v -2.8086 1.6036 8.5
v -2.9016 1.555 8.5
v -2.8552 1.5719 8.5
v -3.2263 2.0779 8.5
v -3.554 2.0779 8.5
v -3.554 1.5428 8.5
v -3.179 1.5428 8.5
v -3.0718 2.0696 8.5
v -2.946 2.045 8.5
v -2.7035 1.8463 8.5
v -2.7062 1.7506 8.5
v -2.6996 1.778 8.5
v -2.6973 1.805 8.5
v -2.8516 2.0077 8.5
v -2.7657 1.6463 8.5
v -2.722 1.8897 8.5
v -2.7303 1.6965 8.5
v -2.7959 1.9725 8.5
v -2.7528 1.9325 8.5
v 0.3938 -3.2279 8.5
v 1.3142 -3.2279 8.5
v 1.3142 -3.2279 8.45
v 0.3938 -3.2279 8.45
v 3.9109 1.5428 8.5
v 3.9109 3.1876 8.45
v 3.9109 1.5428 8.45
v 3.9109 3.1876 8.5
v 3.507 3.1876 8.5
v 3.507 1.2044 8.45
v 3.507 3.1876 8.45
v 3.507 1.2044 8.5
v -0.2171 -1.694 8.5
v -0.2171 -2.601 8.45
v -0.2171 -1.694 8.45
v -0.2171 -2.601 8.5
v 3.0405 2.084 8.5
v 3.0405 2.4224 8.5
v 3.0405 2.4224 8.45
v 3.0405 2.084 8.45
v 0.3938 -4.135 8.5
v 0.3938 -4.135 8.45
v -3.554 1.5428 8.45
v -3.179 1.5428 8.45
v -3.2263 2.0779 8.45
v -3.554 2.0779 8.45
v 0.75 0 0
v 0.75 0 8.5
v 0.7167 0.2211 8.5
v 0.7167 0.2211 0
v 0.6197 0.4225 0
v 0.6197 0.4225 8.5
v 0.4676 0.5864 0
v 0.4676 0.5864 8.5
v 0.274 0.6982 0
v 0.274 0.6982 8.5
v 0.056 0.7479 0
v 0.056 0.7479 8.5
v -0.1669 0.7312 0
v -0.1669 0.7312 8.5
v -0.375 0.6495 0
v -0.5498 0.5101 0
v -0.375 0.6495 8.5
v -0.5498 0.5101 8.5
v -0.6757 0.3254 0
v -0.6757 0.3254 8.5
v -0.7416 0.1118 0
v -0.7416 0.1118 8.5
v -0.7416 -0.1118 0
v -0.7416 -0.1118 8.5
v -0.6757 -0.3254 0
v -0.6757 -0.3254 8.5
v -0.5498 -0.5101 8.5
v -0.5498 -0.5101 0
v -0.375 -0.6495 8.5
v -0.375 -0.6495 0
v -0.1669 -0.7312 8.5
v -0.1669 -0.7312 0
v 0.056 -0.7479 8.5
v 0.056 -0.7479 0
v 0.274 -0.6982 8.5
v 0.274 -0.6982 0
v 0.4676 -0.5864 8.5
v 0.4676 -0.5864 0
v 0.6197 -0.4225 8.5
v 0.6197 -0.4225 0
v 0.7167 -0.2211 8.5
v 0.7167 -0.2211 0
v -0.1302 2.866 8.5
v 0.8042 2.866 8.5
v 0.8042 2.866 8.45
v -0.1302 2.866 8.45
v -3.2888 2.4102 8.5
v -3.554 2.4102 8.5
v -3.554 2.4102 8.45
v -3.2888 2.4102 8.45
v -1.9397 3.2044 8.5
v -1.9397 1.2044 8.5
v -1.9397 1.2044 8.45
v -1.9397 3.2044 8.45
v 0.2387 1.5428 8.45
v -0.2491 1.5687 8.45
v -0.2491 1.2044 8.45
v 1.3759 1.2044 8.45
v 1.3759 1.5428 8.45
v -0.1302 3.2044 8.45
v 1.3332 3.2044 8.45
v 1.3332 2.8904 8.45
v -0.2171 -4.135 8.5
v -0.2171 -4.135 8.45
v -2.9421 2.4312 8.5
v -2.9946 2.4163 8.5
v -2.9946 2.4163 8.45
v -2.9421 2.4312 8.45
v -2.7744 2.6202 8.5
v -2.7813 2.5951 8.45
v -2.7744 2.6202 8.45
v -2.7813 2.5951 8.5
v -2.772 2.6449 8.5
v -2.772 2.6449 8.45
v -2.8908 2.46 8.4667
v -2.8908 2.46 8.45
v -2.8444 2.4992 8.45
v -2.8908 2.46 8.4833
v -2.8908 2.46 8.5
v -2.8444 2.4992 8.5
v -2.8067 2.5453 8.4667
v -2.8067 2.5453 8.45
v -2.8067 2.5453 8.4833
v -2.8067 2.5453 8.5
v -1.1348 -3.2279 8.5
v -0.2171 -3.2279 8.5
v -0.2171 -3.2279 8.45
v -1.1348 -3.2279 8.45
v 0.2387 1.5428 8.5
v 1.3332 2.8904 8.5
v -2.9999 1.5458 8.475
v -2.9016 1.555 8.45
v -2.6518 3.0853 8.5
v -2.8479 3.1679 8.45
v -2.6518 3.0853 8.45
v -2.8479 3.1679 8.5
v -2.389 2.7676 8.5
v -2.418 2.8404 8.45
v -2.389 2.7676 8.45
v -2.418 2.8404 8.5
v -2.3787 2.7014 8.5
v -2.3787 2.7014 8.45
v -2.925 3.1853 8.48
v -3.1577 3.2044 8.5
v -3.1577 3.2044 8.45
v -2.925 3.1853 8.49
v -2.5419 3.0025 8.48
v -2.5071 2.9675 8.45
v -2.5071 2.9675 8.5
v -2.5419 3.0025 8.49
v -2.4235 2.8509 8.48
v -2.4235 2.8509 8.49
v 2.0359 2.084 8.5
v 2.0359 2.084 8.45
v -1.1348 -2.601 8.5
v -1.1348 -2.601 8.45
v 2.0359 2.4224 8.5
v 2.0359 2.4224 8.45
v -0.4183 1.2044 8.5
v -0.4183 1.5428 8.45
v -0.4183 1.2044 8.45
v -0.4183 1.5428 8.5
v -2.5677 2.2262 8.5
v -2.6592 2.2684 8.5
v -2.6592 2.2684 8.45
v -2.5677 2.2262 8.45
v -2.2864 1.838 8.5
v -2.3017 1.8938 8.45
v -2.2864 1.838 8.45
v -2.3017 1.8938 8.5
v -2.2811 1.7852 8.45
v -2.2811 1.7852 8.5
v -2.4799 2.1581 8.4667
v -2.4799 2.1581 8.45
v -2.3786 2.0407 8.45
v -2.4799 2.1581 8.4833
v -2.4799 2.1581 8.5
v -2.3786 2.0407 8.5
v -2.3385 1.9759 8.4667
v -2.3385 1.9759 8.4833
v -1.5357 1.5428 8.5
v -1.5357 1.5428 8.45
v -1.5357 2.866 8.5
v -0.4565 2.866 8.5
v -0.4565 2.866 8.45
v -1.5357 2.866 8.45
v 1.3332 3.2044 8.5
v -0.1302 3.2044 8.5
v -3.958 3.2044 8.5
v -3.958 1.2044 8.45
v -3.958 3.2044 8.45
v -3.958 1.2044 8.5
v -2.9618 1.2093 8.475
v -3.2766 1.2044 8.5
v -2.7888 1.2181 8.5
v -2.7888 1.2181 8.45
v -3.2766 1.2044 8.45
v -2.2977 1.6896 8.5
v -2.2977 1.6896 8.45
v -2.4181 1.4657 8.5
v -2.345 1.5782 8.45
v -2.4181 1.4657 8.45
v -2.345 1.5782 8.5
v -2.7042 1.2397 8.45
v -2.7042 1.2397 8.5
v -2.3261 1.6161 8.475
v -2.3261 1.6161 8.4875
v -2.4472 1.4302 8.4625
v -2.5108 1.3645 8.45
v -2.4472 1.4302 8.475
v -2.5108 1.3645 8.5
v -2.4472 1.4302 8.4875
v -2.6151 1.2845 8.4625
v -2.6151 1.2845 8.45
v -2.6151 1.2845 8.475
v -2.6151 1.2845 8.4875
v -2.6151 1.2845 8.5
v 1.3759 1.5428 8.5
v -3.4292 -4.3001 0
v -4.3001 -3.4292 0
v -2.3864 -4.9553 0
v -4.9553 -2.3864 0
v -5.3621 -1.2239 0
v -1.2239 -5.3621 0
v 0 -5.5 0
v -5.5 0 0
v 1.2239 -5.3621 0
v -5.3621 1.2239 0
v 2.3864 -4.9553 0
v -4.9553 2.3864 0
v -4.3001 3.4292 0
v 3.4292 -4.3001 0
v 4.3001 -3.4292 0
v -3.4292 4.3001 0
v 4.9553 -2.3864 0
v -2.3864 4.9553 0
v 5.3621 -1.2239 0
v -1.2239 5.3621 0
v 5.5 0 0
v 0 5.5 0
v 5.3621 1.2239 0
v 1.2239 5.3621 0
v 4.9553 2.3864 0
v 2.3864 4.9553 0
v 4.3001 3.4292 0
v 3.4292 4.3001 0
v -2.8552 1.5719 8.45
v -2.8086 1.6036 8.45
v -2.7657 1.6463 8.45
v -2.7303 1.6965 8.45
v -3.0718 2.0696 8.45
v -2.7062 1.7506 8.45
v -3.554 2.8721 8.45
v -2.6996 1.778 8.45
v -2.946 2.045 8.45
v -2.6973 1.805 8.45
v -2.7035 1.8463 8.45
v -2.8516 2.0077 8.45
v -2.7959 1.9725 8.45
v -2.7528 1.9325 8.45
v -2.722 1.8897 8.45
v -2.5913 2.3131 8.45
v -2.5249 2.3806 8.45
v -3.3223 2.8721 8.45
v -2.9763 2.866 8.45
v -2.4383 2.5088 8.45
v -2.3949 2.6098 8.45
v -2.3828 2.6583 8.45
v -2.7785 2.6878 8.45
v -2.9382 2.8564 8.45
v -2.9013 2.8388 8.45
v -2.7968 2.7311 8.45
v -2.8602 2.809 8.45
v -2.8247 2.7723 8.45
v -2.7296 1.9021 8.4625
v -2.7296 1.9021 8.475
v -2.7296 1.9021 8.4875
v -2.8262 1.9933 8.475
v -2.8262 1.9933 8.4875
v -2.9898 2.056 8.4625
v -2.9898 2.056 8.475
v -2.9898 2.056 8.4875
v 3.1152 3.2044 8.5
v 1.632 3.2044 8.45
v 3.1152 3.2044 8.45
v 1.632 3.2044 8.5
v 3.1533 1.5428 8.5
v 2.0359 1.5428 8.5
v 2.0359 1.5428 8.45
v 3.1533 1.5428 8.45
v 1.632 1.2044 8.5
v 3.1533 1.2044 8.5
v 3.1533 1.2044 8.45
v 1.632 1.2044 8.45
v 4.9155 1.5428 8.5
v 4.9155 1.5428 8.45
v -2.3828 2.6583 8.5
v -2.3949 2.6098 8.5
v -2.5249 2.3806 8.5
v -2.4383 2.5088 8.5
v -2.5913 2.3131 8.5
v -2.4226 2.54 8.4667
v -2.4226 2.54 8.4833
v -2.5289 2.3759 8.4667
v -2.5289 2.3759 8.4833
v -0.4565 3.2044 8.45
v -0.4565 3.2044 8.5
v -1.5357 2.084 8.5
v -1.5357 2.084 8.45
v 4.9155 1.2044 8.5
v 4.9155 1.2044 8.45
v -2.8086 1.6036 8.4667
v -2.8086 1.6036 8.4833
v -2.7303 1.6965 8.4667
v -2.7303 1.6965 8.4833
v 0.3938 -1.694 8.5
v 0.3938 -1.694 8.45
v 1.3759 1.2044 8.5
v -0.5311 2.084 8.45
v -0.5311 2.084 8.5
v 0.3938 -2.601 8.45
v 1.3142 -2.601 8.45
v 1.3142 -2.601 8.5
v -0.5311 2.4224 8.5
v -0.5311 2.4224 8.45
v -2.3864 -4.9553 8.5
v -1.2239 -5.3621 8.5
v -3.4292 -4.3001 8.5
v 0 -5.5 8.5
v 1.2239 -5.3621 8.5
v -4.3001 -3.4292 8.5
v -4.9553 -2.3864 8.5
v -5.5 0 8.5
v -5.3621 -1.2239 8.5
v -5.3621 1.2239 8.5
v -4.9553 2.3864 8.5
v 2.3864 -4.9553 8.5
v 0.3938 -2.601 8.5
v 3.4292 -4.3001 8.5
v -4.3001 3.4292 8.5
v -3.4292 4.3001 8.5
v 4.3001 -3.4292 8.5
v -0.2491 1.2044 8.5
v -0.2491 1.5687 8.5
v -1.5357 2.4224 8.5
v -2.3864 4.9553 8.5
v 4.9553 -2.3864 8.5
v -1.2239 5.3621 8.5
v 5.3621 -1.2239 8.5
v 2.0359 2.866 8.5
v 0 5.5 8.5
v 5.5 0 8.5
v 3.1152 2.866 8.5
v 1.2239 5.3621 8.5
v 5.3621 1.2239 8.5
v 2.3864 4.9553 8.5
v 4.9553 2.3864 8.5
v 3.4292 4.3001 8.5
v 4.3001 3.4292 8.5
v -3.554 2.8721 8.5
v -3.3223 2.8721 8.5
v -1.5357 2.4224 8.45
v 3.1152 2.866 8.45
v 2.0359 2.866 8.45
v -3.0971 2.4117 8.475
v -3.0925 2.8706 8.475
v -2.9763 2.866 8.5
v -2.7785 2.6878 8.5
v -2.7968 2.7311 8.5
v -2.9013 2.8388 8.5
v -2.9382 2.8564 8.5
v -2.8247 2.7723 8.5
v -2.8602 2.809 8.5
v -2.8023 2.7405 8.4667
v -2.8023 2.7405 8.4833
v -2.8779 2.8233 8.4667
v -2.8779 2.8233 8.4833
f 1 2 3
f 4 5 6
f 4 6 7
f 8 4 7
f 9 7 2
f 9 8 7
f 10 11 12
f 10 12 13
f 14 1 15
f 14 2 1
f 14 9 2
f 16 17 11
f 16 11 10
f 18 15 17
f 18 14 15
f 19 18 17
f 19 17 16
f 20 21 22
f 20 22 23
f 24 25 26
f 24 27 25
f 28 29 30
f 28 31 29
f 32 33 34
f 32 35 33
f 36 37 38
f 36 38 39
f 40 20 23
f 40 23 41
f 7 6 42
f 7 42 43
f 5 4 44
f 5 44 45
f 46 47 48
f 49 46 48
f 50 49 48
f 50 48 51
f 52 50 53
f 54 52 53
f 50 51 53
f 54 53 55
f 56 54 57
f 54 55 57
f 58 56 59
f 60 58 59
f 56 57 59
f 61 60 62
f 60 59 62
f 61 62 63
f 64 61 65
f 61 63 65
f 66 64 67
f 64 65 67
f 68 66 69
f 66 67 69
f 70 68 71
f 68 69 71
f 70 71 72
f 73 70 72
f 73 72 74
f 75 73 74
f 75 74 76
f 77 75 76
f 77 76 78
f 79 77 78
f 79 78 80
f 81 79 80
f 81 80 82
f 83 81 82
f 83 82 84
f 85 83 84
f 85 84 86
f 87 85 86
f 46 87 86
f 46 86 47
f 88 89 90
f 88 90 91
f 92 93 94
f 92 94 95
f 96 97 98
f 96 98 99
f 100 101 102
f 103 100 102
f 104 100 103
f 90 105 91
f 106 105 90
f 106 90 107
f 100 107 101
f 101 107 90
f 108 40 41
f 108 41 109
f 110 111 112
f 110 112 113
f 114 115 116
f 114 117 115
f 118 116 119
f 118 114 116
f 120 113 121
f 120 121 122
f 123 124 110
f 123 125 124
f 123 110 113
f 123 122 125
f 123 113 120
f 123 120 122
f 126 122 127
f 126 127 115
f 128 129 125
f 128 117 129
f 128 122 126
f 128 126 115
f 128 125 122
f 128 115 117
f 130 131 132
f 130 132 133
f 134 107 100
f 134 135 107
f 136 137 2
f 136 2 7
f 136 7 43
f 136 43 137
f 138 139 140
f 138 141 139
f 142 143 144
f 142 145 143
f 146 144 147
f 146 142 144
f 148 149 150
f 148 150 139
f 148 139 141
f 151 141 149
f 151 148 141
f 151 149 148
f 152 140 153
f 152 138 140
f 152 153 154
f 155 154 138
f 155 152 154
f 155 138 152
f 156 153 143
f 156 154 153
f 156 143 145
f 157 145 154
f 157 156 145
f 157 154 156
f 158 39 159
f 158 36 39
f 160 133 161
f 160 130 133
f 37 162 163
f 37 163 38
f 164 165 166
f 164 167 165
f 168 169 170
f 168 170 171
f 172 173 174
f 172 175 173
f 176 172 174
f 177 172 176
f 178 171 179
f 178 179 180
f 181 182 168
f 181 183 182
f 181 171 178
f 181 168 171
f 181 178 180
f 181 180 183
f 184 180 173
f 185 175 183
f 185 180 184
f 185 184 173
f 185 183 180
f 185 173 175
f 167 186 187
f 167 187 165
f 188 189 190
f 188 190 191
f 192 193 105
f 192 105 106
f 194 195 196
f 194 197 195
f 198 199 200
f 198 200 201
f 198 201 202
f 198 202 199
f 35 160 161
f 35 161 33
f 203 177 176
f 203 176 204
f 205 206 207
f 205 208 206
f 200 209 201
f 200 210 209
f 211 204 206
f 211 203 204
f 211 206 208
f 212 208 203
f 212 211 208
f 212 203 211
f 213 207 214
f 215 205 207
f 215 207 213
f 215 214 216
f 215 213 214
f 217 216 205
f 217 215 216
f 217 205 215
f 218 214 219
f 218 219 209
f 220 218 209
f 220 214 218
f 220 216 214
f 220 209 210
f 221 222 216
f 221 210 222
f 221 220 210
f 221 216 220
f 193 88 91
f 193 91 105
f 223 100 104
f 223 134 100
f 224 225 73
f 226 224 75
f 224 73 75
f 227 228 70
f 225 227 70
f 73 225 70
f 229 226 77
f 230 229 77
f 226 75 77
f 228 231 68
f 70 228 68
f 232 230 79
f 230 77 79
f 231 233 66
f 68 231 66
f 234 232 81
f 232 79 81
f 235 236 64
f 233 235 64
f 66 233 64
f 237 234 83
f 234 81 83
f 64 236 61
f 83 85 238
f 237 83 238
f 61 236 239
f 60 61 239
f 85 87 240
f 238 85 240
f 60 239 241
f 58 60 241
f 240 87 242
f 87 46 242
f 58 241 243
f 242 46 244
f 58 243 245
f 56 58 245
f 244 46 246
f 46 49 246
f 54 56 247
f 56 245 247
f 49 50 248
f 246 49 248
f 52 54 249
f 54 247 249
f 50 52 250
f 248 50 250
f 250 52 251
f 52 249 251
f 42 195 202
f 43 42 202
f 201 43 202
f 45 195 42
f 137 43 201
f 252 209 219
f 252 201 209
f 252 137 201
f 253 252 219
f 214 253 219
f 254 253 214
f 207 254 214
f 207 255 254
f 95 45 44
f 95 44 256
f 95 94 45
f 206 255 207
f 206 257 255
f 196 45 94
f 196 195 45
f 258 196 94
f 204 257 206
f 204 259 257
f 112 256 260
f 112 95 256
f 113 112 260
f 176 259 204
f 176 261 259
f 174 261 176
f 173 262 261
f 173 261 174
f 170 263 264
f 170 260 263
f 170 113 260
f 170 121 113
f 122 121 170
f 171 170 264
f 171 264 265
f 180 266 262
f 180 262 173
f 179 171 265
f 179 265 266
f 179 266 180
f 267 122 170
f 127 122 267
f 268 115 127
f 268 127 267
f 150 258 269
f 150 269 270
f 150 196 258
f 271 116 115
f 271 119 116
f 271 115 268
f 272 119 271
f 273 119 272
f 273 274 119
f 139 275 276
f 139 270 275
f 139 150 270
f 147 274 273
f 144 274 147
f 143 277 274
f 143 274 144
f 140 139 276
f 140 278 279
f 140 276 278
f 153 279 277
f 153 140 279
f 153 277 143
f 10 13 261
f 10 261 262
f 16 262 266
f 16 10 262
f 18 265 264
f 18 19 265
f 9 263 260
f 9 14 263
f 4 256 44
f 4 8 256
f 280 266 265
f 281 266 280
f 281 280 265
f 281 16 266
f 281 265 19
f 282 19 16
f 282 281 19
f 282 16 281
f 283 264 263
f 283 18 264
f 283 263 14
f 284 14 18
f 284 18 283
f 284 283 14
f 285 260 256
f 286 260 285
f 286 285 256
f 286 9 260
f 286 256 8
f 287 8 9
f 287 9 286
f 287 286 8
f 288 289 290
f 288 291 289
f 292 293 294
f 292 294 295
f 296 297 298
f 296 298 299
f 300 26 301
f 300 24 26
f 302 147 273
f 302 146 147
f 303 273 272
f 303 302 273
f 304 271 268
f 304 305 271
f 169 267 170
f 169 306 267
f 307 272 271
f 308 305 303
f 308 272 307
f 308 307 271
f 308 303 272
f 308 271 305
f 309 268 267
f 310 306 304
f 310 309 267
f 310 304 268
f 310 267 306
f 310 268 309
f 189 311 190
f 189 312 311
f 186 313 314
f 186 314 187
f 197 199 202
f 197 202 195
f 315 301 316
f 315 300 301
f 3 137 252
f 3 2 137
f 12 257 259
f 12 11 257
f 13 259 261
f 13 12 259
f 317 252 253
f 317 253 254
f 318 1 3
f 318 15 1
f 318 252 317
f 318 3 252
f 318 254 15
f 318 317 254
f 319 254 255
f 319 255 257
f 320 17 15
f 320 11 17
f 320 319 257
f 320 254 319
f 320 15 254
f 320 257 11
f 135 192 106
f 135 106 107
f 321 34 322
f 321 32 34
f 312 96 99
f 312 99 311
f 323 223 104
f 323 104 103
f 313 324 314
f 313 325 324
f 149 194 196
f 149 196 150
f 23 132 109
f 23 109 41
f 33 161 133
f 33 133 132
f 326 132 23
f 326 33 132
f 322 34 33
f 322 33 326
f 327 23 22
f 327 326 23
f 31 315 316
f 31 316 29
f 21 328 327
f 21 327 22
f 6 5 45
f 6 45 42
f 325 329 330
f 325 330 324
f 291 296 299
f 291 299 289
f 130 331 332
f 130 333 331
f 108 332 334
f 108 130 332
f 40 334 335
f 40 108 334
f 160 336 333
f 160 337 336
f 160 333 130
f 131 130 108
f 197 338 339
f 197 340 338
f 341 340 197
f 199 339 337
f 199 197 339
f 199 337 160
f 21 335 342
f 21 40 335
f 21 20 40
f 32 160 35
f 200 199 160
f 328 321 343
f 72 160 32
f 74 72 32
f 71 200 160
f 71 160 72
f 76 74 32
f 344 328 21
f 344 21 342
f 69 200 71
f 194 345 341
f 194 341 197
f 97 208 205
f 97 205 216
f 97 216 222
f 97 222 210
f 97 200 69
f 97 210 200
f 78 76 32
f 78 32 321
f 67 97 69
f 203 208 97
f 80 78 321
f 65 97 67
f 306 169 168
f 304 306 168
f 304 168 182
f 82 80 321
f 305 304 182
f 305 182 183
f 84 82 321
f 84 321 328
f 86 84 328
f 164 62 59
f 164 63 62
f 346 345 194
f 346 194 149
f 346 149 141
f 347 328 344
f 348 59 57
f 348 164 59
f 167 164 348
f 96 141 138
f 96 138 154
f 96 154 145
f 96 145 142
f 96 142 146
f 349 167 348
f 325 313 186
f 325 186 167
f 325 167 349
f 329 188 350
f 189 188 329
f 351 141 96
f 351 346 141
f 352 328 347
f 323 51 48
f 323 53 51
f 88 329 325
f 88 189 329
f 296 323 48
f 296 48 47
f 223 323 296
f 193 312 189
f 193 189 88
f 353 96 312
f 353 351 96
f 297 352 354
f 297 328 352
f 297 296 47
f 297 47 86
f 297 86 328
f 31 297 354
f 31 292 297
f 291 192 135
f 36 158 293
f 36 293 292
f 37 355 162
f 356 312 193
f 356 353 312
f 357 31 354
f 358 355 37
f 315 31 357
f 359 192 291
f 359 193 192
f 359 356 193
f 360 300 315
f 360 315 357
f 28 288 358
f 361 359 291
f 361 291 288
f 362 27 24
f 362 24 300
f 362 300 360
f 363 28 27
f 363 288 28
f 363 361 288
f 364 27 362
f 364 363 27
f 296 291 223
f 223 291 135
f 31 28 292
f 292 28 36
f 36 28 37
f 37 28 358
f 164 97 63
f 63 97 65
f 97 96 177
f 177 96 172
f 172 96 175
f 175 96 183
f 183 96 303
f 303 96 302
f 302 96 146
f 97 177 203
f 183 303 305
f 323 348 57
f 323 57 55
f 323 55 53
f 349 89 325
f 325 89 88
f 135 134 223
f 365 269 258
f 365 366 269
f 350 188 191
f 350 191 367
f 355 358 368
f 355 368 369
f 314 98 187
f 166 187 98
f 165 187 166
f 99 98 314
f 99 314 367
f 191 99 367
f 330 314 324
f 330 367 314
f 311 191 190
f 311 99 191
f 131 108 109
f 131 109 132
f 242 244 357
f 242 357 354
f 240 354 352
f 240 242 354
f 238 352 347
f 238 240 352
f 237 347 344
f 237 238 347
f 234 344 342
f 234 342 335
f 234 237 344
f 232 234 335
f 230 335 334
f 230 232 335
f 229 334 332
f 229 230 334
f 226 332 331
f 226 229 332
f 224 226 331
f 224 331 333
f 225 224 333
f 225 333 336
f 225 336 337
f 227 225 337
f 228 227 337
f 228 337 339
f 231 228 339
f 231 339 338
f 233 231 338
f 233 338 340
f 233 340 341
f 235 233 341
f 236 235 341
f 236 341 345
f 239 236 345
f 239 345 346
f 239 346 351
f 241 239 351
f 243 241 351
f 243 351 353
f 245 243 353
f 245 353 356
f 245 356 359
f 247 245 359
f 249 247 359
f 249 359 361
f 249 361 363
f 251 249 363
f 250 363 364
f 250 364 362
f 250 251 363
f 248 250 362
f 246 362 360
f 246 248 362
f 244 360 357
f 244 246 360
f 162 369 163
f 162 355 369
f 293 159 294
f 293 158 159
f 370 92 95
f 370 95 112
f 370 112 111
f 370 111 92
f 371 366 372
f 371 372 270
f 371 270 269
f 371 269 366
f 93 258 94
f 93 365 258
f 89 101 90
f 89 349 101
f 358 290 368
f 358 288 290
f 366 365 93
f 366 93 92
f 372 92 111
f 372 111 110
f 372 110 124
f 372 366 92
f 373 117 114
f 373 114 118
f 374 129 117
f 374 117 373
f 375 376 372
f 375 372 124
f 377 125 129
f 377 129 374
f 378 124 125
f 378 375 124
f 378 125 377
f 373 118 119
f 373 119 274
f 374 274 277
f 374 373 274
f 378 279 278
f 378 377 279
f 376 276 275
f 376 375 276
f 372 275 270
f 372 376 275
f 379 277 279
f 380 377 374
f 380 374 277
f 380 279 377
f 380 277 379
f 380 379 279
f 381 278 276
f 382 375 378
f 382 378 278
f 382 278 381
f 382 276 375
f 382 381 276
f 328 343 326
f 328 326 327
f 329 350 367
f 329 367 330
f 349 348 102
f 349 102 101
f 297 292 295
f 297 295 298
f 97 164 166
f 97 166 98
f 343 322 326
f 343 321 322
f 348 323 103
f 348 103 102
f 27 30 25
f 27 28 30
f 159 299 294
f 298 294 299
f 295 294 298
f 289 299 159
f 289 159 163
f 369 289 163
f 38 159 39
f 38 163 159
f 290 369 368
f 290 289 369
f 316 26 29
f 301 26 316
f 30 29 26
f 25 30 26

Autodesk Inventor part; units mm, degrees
ref_plane "YZ Plane" through (0, 0, 0) normal (1, 0, 0) x (0, 1, 0)
ref_plane "XZ Plane" through (0, 0, 0) normal (0, 1, 0) x (-1, 0, 0)
ref_plane "XY Plane" through (0, 0, 0) normal (0, 0, 1) x (1, 0, 0)
sketch "Sketch1" plane through (0, 0, 0) normal (0, 0, 1) x (1, 0, 0)
  line L0 (0, 8.8) -> (0, -6.6) projected
  line L1 (-6.6, 0) -> (8.8, 0) projected
  circle A0 centre (0, 0) radius 5.5
  dimension "d0" = 11
extrude "Extrusion1" add sketch "Sketch1" along normal blind 8.5
sketch "Sketch2" plane through (0, 0, 8.5) normal (0, 0, 1) x (1, 0, 0)
  circle A0 centre (0, 0) radius 5.5 projected
  circle A1 centre (0, 0) radius 0.75
  dimension "d3" = 1.5
extrude "Extrusion2" cut sketch "Sketch2" against normal through all contours A1
sketch "Sketch3" plane through (0, 0, 8.5) normal (0, 0, 1) x (1, 0, 0)
  line L0 (-4.1622, 3.2044) -> (11.3317, 3.2044) construction
  line L1 (11.3317, 3.2044) -> (11.3317, -0.2956) construction
  line L2 (11.3317, -0.2956) -> (-4.1622, -0.2956) construction
  line L3 (-4.1622, -0.2956) -> (-4.1622, 3.2044) construction
  line L4 (-1.3375, -1.694) -> (1.5169, -1.694) construction
  line L5 (1.5169, -1.694) -> (1.5169, -4.135) construction
  line L6 (1.5169, -4.135) -> (-1.3375, -4.135) construction
  line L7 (-1.3375, -4.135) -> (-1.3375, -1.694) construction
  line L8 (-3.958, 3.2044) -> (-3.1577, 3.2044)
  spline S0 degree 5 poles (-3.1577, 3.2044) (-2.9199, 3.2044) (-2.6866, 3.1648) (-2.5022, 3.0398) (-2.3787, 2.8309) (-2.3787, 2.7014) knots 0 0 0 0 0 0 1 1 1 1 1 1
  spline S1 degree 3 poles (-2.3787, 2.7014) (-2.3787, 2.5611) (-2.5296, 2.3279) (-2.6592, 2.2684) knots 0 0 0 0 1 1 1 1
  spline S2 degree 3 poles (-2.6592, 2.2684) (-2.4763, 2.2151) (-2.2811, 1.959) (-2.2811, 1.7852) knots 0 0 0 0 1 1 1 1
  spline S3 degree 4 poles (-2.2811, 1.7852) (-2.2811, 1.648) (-2.4077, 1.3904) (-2.6287, 1.2364) (-2.7888, 1.2181) knots 0 0 0 0 0 1 1 1 1 1
  spline S4 degree 2 poles (-2.7888, 1.2181) (-2.8909, 1.2074) (-3.2766, 1.2044) knots 0 0 0 1 1 1
  line L9 (-3.2766, 1.2044) -> (-3.958, 1.2044)
  line L10 (-3.958, 1.2044) -> (-3.958, 3.2044)
  line L11 (-3.554, 2.0779) -> (-3.554, 1.5428)
  line L12 (-3.554, 1.5428) -> (-3.179, 1.5428)
  spline S5 degree 2 poles (-3.179, 1.5428) (-2.9595, 1.5428) (-2.9016, 1.555) knots 0 0 0 1 1 1
  spline S6 degree 3 poles (-2.9016, 1.555) (-2.8116, 1.5718) (-2.6973, 1.6983) (-2.6973, 1.805) knots 0 0 0 0 1 1 1 1
  spline S7 degree 4 poles (-2.6973, 1.805) (-2.6973, 1.8949) (-2.7842, 2.0199) (-2.9504, 2.0779) (-3.2263, 2.0779) knots 0 0 0 0 0 1 1 1 1 1
  line L13 (-3.2263, 2.0779) -> (-3.554, 2.0779)
  line L14 (-3.554, 2.8721) -> (-3.554, 2.4102)
  line L15 (-3.554, 2.4102) -> (-3.2888, 2.4102)
  spline S8 degree 2 poles (-3.2888, 2.4102) (-3.0525, 2.4102) (-2.9946, 2.4163) knots 0 0 0 1 1 1
  spline S9 degree 3 poles (-2.9946, 2.4163) (-2.8909, 2.43) (-2.772, 2.5474) (-2.772, 2.6449) knots 0 0 0 0 1 1 1 1
  spline S10 degree 3 poles (-2.772, 2.6449) (-2.772, 2.7379) (-2.8741, 2.8523) (-2.9763, 2.866) knots 0 0 0 0 1 1 1 1
  spline S11 degree 2 poles (-2.9763, 2.866) (-3.0357, 2.8721) (-3.3223, 2.8721) knots 0 0 0 1 1 1
  line L16 (-3.3223, 2.8721) -> (-3.554, 2.8721)
  line L17 (-1.9397, 1.2044) -> (-1.9397, 3.2044)
  line L18 (-1.9397, 3.2044) -> (-0.4565, 3.2044)
  line L19 (-0.4565, 3.2044) -> (-0.4565, 2.866)
  line L20 (-0.4565, 2.866) -> (-1.5357, 2.866)
  line L21 (-1.5357, 2.866) -> (-1.5357, 2.4224)
  line L22 (-1.5357, 2.4224) -> (-0.5311, 2.4224)
  line L23 (-0.5311, 2.4224) -> (-0.5311, 2.084)
  line L24 (-0.5311, 2.084) -> (-1.5357, 2.084)
  line L25 (-1.5357, 2.084) -> (-1.5357, 1.5428)
  line L26 (-1.5357, 1.5428) -> (-0.4183, 1.5428)
  line L27 (-0.4183, 1.5428) -> (-0.4183, 1.2044)
  line L28 (-0.4183, 1.2044) -> (-1.9397, 1.2044)
  line L29 (-0.2491, 1.2044) -> (-0.2491, 1.5687)
  line L30 (-0.2491, 1.5687) -> (0.8042, 2.866)
  line L31 (0.8042, 2.866) -> (-0.1302, 2.866)
  line L32 (-0.1302, 2.866) -> (-0.1302, 3.2044)
  line L33 (-0.1302, 3.2044) -> (1.3332, 3.2044)
  line L34 (1.3332, 3.2044) -> (1.3332, 2.8904)
  line L35 (1.3332, 2.8904) -> (0.2387, 1.5428)
  line L36 (0.2387, 1.5428) -> (1.3759, 1.5428)
  line L37 (1.3759, 1.5428) -> (1.3759, 1.2044)
  line L38 (1.3759, 1.2044) -> (-0.2491, 1.2044)
  line L39 (1.632, 1.2044) -> (1.632, 3.2044)
  line L40 (1.632, 3.2044) -> (3.1152, 3.2044)
  line L41 (3.1152, 3.2044) -> (3.1152, 2.866)
  line L42 (3.1152, 2.866) -> (2.0359, 2.866)
  line L43 (2.0359, 2.866) -> (2.0359, 2.4224)
  line L44 (2.0359, 2.4224) -> (3.0405, 2.4224)
  line L45 (3.0405, 2.4224) -> (3.0405, 2.084)
  line L46 (3.0405, 2.084) -> (2.0359, 2.084)
  line L47 (2.0359, 2.084) -> (2.0359, 1.5428)
  line L48 (2.0359, 1.5428) -> (3.1533, 1.5428)
  line L49 (3.1533, 1.5428) -> (3.1533, 1.2044)
  line L50 (3.1533, 1.2044) -> (1.632, 1.2044)
  line L51 (3.507, 1.2044) -> (3.507, 3.1876)
  line L52 (3.507, 3.1876) -> (3.9109, 3.1876)
  line L53 (3.9109, 3.1876) -> (3.9109, 1.5428)
  line L54 (3.9109, 1.5428) -> (4.9155, 1.5428)
  line L55 (4.9155, 1.5428) -> (4.9155, 1.2044)
  line L56 (4.9155, 1.2044) -> (3.507, 1.2044)
  line L57 (-0.2171, -4.135) -> (-0.2171, -3.2279)
  line L58 (-0.2171, -3.2279) -> (-1.1348, -3.2279)
  line L59 (-1.1348, -3.2279) -> (-1.1348, -2.601)
  line L60 (-1.1348, -2.601) -> (-0.2171, -2.601)
  line L61 (-0.2171, -2.601) -> (-0.2171, -1.694)
  line L62 (-0.2171, -1.694) -> (0.3938, -1.694)
  line L63 (0.3938, -1.694) -> (0.3938, -2.601)
  line L64 (0.3938, -2.601) -> (1.3142, -2.601)
  line L65 (1.3142, -2.601) -> (1.3142, -3.2279)
  line L66 (1.3142, -3.2279) -> (0.3938, -3.2279)
  line L67 (0.3938, -3.2279) -> (0.3938, -4.135)
  line L68 (0.3938, -4.135) -> (-0.2171, -4.135)
extrude "Extrusion3" cut sketch "Sketch3" against normal blind 0.05
properties part number "config - bezel"
